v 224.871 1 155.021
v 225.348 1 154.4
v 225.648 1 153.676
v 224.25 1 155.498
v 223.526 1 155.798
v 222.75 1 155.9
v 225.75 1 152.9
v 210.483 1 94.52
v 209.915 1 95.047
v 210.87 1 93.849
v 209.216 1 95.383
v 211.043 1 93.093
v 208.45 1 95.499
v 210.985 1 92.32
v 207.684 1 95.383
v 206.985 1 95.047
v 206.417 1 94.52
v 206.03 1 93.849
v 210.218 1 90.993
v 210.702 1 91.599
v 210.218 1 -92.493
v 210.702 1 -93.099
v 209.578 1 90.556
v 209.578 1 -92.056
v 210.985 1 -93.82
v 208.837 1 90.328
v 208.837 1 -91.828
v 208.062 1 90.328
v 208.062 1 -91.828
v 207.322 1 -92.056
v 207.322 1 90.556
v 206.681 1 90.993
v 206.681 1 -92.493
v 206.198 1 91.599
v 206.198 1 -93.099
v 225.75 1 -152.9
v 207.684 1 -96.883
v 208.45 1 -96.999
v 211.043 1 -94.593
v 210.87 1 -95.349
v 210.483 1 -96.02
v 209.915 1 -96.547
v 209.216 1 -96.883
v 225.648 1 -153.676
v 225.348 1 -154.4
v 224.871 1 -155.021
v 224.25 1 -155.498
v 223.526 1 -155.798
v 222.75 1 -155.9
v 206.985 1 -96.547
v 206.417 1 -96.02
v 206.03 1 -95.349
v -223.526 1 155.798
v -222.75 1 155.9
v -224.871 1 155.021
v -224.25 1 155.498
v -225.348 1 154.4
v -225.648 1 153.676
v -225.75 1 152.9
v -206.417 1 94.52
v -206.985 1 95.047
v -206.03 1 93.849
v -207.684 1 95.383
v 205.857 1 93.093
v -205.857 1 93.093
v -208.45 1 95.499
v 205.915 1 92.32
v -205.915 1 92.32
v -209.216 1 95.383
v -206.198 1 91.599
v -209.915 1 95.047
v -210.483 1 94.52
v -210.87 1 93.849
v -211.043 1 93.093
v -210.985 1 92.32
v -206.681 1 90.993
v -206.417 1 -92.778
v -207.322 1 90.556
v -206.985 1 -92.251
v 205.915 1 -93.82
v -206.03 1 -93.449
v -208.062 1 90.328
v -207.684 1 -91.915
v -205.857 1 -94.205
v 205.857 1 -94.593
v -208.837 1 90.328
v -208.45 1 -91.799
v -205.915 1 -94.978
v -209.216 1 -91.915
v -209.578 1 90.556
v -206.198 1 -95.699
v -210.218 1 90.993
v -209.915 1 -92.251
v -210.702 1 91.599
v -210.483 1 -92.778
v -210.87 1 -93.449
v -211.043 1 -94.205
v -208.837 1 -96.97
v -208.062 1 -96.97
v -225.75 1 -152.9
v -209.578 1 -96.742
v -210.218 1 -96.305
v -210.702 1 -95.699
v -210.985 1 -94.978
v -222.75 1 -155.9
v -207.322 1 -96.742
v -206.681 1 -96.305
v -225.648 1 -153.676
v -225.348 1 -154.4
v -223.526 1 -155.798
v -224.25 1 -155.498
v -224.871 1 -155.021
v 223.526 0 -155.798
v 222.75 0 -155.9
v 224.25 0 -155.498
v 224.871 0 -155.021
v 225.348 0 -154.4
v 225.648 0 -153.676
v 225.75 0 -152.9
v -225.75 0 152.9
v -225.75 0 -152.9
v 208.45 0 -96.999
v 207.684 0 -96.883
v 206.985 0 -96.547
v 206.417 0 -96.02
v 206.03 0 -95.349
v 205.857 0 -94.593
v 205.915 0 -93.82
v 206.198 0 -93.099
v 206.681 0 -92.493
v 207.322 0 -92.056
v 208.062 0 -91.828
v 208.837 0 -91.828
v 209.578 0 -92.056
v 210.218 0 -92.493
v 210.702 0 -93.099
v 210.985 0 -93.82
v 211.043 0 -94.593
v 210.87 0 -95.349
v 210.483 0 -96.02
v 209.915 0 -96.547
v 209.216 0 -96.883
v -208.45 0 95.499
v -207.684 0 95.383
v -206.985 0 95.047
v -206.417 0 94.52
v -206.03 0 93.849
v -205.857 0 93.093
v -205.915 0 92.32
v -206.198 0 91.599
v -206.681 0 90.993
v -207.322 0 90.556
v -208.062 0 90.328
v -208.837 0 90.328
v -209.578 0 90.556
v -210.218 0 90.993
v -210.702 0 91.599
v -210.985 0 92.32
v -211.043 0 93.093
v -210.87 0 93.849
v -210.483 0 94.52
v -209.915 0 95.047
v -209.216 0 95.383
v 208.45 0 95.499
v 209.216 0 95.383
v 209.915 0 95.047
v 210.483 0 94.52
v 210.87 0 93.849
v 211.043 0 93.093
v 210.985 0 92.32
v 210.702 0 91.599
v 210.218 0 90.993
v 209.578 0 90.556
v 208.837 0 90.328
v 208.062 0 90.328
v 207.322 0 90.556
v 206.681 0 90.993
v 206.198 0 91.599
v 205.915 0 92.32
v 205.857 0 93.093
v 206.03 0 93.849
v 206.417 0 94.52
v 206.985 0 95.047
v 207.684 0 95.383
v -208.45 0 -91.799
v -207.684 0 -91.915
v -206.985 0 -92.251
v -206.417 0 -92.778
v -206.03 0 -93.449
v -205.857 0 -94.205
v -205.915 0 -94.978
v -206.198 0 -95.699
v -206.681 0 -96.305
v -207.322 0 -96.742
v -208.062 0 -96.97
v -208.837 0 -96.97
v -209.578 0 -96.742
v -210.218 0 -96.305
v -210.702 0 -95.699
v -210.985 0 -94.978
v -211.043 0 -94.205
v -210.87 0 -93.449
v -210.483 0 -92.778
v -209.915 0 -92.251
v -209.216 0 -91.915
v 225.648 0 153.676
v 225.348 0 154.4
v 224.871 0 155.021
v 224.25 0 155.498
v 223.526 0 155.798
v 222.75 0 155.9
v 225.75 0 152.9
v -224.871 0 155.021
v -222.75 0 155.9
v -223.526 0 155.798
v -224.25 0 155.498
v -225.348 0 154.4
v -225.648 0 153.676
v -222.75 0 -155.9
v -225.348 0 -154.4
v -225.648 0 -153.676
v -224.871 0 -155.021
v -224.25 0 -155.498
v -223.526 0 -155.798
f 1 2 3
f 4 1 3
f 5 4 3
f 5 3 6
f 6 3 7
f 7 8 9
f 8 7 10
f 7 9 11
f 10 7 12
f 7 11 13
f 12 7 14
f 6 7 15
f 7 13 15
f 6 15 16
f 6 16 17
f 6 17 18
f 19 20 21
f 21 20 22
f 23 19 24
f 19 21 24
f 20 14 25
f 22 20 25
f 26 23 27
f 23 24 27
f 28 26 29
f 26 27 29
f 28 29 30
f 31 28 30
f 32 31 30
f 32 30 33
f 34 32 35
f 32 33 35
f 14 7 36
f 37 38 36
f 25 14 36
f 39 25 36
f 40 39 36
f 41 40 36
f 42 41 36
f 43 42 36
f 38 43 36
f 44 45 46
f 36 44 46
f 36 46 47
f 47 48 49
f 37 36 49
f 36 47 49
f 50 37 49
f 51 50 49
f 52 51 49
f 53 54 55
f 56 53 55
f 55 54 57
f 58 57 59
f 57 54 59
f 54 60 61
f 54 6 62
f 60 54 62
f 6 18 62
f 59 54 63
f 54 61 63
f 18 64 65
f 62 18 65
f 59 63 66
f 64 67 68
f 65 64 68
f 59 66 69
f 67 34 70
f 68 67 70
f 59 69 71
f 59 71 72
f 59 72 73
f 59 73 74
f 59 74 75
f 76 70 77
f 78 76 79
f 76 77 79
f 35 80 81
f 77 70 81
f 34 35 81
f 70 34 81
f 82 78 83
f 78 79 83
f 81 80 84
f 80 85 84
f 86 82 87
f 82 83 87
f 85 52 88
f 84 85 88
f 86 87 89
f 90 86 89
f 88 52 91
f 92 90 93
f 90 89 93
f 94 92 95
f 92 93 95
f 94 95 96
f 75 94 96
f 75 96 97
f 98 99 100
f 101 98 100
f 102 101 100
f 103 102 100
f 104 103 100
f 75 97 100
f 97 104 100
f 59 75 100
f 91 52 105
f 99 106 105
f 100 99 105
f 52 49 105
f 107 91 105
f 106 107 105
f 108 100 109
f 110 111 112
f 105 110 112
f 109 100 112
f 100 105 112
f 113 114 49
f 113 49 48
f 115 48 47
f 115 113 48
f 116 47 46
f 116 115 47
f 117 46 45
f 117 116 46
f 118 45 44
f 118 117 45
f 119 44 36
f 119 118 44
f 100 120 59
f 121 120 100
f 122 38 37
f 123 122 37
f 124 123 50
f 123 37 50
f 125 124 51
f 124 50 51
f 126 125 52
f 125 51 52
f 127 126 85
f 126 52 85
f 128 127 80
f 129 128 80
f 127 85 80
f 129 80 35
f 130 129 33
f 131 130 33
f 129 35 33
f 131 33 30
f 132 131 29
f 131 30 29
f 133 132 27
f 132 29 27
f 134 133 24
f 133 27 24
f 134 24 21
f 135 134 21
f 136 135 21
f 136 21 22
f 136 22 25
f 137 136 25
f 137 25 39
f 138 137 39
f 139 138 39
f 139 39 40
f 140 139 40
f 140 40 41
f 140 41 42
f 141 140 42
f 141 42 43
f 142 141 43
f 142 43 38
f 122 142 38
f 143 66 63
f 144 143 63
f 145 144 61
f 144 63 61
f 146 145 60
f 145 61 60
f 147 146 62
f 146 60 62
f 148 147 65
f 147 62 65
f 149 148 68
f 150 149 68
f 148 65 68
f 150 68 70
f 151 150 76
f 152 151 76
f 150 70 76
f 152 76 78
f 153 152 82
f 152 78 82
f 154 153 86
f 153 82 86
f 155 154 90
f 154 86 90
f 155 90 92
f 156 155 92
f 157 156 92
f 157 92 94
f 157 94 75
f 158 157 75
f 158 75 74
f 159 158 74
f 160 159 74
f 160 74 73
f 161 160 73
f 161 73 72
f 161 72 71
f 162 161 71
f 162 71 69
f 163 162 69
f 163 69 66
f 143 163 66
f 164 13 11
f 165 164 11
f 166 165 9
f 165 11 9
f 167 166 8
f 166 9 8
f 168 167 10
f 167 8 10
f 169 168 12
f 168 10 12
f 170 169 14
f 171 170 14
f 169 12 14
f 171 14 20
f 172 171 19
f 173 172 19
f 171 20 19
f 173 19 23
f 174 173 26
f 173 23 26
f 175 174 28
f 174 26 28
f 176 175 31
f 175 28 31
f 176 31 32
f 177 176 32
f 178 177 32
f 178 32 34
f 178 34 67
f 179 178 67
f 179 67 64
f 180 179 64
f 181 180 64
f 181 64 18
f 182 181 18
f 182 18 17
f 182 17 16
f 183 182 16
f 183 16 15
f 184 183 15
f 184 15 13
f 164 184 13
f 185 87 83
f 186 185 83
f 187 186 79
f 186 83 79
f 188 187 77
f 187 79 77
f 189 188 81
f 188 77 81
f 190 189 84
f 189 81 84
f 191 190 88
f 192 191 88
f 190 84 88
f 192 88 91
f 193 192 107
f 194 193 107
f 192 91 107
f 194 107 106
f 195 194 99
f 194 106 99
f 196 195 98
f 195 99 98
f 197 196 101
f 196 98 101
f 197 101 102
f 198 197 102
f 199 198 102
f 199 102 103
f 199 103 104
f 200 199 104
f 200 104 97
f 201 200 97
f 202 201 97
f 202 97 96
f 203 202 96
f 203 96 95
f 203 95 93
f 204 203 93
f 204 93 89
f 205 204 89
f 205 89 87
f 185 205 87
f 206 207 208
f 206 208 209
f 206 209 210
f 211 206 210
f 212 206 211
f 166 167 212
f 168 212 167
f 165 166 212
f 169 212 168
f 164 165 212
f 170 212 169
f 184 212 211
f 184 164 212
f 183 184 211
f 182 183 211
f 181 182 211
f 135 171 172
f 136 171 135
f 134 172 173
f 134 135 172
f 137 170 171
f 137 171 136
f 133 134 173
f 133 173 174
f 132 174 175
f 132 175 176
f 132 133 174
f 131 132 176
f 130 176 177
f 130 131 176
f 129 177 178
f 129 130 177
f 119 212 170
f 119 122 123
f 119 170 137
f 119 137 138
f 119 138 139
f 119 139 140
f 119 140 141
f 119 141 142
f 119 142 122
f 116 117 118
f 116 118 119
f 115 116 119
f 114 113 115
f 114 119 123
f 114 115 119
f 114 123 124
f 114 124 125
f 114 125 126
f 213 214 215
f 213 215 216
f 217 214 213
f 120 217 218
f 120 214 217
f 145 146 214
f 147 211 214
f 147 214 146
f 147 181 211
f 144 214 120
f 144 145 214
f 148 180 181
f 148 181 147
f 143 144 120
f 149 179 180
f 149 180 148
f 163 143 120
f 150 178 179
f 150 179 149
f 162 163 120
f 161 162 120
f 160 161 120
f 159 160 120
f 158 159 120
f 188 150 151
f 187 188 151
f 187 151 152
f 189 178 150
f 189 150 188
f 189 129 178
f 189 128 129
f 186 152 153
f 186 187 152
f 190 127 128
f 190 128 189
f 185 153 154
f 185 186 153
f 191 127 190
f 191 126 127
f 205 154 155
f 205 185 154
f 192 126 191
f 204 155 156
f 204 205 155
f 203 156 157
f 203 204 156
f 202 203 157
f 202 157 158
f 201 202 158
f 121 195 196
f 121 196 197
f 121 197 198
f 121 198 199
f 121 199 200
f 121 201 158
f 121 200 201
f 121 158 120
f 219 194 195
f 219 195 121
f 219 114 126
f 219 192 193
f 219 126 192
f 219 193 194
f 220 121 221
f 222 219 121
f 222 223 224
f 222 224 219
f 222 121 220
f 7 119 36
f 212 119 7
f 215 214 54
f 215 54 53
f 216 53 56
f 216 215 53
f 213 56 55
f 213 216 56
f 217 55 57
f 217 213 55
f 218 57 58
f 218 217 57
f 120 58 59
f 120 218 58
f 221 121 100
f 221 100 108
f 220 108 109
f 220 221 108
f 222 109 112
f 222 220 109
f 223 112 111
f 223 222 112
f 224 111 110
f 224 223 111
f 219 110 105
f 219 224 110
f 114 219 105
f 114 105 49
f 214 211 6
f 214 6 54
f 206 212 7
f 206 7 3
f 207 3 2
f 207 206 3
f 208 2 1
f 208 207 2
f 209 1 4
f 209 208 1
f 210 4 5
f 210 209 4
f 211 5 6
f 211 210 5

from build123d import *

# Parameters (mm, degrees)
BOSS_EXTRUDE1_DEPTH = 1
SKETCH5_R           = 2.6
CUT_EXTRUDE1_DEPTH  = 275.35173136


with BuildPart() as part:
    # Sketch1 → Boss-Extrude1 (new body)
    with BuildSketch(Plane(origin=(0, 0, 0), x_dir=(1, 0, 0), z_dir=(0, 1, 0))):
        with BuildLine():
            Line((-203.525, 155.9), (203.525, 155.9))
            Line((203.525, 155.9), (222.75, 155.9))
            ThreePointArc((222.75, 155.9), (224.871320344, 155.021320344), (225.75, 152.9))
            Line((225.75, 152.9), (225.75, 133.675))
            Line((225.75, 133.675), (225.75, -133.675))
            Line((225.75, -133.675), (225.75, -152.9))
            ThreePointArc((225.75, -152.9), (224.871320344, -155.021320344), (222.75, -155.9))
            Line((222.75, -155.9), (203.525, -155.9))
            Line((203.525, -155.9), (-203.525, -155.9))
            Line((-203.525, -155.9), (-222.75, -155.9))
            ThreePointArc((-222.75, -155.9), (-224.871320344, -155.021320344), (-225.75, -152.9))
            Line((-225.75, -152.9), (-225.75, -133.675))
            Line((-225.75, -133.675), (-225.75, 133.675))
            Line((-225.75, 133.675), (-225.75, 152.9))
            ThreePointArc((-225.75, 152.9), (-224.871320344, 155.021320344), (-222.75, 155.9))
            Line((-222.75, 155.9), (-203.525, 155.9))
        make_face()
    extrude(amount=BOSS_EXTRUDE1_DEPTH)

    # Sketch5 → Cut-Extrude1 (cut, through all)
    with BuildSketch(Plane(origin=(0, 1, 0), x_dir=(1, 0, 0), z_dir=(0, 1, 0))):
        with Locations(Location((-208.44992, 94.399, 0), (0, 0, 270))):
            Circle(SKETCH5_R)
        with Locations(Location((208.44992, 94.399, 0), (0, 0, 90))):
            Circle(SKETCH5_R)
        with Locations(Location((-208.44992, -92.899, 0), (0, 0, 270))):
            Circle(SKETCH5_R)
        with Locations(Location((208.44992, -92.899, 0), (0, 0, 270))):
            Circle(SKETCH5_R)
    extrude(amount=-CUT_EXTRUDE1_DEPTH, mode=Mode.SUBTRACT)


solid = part.part
